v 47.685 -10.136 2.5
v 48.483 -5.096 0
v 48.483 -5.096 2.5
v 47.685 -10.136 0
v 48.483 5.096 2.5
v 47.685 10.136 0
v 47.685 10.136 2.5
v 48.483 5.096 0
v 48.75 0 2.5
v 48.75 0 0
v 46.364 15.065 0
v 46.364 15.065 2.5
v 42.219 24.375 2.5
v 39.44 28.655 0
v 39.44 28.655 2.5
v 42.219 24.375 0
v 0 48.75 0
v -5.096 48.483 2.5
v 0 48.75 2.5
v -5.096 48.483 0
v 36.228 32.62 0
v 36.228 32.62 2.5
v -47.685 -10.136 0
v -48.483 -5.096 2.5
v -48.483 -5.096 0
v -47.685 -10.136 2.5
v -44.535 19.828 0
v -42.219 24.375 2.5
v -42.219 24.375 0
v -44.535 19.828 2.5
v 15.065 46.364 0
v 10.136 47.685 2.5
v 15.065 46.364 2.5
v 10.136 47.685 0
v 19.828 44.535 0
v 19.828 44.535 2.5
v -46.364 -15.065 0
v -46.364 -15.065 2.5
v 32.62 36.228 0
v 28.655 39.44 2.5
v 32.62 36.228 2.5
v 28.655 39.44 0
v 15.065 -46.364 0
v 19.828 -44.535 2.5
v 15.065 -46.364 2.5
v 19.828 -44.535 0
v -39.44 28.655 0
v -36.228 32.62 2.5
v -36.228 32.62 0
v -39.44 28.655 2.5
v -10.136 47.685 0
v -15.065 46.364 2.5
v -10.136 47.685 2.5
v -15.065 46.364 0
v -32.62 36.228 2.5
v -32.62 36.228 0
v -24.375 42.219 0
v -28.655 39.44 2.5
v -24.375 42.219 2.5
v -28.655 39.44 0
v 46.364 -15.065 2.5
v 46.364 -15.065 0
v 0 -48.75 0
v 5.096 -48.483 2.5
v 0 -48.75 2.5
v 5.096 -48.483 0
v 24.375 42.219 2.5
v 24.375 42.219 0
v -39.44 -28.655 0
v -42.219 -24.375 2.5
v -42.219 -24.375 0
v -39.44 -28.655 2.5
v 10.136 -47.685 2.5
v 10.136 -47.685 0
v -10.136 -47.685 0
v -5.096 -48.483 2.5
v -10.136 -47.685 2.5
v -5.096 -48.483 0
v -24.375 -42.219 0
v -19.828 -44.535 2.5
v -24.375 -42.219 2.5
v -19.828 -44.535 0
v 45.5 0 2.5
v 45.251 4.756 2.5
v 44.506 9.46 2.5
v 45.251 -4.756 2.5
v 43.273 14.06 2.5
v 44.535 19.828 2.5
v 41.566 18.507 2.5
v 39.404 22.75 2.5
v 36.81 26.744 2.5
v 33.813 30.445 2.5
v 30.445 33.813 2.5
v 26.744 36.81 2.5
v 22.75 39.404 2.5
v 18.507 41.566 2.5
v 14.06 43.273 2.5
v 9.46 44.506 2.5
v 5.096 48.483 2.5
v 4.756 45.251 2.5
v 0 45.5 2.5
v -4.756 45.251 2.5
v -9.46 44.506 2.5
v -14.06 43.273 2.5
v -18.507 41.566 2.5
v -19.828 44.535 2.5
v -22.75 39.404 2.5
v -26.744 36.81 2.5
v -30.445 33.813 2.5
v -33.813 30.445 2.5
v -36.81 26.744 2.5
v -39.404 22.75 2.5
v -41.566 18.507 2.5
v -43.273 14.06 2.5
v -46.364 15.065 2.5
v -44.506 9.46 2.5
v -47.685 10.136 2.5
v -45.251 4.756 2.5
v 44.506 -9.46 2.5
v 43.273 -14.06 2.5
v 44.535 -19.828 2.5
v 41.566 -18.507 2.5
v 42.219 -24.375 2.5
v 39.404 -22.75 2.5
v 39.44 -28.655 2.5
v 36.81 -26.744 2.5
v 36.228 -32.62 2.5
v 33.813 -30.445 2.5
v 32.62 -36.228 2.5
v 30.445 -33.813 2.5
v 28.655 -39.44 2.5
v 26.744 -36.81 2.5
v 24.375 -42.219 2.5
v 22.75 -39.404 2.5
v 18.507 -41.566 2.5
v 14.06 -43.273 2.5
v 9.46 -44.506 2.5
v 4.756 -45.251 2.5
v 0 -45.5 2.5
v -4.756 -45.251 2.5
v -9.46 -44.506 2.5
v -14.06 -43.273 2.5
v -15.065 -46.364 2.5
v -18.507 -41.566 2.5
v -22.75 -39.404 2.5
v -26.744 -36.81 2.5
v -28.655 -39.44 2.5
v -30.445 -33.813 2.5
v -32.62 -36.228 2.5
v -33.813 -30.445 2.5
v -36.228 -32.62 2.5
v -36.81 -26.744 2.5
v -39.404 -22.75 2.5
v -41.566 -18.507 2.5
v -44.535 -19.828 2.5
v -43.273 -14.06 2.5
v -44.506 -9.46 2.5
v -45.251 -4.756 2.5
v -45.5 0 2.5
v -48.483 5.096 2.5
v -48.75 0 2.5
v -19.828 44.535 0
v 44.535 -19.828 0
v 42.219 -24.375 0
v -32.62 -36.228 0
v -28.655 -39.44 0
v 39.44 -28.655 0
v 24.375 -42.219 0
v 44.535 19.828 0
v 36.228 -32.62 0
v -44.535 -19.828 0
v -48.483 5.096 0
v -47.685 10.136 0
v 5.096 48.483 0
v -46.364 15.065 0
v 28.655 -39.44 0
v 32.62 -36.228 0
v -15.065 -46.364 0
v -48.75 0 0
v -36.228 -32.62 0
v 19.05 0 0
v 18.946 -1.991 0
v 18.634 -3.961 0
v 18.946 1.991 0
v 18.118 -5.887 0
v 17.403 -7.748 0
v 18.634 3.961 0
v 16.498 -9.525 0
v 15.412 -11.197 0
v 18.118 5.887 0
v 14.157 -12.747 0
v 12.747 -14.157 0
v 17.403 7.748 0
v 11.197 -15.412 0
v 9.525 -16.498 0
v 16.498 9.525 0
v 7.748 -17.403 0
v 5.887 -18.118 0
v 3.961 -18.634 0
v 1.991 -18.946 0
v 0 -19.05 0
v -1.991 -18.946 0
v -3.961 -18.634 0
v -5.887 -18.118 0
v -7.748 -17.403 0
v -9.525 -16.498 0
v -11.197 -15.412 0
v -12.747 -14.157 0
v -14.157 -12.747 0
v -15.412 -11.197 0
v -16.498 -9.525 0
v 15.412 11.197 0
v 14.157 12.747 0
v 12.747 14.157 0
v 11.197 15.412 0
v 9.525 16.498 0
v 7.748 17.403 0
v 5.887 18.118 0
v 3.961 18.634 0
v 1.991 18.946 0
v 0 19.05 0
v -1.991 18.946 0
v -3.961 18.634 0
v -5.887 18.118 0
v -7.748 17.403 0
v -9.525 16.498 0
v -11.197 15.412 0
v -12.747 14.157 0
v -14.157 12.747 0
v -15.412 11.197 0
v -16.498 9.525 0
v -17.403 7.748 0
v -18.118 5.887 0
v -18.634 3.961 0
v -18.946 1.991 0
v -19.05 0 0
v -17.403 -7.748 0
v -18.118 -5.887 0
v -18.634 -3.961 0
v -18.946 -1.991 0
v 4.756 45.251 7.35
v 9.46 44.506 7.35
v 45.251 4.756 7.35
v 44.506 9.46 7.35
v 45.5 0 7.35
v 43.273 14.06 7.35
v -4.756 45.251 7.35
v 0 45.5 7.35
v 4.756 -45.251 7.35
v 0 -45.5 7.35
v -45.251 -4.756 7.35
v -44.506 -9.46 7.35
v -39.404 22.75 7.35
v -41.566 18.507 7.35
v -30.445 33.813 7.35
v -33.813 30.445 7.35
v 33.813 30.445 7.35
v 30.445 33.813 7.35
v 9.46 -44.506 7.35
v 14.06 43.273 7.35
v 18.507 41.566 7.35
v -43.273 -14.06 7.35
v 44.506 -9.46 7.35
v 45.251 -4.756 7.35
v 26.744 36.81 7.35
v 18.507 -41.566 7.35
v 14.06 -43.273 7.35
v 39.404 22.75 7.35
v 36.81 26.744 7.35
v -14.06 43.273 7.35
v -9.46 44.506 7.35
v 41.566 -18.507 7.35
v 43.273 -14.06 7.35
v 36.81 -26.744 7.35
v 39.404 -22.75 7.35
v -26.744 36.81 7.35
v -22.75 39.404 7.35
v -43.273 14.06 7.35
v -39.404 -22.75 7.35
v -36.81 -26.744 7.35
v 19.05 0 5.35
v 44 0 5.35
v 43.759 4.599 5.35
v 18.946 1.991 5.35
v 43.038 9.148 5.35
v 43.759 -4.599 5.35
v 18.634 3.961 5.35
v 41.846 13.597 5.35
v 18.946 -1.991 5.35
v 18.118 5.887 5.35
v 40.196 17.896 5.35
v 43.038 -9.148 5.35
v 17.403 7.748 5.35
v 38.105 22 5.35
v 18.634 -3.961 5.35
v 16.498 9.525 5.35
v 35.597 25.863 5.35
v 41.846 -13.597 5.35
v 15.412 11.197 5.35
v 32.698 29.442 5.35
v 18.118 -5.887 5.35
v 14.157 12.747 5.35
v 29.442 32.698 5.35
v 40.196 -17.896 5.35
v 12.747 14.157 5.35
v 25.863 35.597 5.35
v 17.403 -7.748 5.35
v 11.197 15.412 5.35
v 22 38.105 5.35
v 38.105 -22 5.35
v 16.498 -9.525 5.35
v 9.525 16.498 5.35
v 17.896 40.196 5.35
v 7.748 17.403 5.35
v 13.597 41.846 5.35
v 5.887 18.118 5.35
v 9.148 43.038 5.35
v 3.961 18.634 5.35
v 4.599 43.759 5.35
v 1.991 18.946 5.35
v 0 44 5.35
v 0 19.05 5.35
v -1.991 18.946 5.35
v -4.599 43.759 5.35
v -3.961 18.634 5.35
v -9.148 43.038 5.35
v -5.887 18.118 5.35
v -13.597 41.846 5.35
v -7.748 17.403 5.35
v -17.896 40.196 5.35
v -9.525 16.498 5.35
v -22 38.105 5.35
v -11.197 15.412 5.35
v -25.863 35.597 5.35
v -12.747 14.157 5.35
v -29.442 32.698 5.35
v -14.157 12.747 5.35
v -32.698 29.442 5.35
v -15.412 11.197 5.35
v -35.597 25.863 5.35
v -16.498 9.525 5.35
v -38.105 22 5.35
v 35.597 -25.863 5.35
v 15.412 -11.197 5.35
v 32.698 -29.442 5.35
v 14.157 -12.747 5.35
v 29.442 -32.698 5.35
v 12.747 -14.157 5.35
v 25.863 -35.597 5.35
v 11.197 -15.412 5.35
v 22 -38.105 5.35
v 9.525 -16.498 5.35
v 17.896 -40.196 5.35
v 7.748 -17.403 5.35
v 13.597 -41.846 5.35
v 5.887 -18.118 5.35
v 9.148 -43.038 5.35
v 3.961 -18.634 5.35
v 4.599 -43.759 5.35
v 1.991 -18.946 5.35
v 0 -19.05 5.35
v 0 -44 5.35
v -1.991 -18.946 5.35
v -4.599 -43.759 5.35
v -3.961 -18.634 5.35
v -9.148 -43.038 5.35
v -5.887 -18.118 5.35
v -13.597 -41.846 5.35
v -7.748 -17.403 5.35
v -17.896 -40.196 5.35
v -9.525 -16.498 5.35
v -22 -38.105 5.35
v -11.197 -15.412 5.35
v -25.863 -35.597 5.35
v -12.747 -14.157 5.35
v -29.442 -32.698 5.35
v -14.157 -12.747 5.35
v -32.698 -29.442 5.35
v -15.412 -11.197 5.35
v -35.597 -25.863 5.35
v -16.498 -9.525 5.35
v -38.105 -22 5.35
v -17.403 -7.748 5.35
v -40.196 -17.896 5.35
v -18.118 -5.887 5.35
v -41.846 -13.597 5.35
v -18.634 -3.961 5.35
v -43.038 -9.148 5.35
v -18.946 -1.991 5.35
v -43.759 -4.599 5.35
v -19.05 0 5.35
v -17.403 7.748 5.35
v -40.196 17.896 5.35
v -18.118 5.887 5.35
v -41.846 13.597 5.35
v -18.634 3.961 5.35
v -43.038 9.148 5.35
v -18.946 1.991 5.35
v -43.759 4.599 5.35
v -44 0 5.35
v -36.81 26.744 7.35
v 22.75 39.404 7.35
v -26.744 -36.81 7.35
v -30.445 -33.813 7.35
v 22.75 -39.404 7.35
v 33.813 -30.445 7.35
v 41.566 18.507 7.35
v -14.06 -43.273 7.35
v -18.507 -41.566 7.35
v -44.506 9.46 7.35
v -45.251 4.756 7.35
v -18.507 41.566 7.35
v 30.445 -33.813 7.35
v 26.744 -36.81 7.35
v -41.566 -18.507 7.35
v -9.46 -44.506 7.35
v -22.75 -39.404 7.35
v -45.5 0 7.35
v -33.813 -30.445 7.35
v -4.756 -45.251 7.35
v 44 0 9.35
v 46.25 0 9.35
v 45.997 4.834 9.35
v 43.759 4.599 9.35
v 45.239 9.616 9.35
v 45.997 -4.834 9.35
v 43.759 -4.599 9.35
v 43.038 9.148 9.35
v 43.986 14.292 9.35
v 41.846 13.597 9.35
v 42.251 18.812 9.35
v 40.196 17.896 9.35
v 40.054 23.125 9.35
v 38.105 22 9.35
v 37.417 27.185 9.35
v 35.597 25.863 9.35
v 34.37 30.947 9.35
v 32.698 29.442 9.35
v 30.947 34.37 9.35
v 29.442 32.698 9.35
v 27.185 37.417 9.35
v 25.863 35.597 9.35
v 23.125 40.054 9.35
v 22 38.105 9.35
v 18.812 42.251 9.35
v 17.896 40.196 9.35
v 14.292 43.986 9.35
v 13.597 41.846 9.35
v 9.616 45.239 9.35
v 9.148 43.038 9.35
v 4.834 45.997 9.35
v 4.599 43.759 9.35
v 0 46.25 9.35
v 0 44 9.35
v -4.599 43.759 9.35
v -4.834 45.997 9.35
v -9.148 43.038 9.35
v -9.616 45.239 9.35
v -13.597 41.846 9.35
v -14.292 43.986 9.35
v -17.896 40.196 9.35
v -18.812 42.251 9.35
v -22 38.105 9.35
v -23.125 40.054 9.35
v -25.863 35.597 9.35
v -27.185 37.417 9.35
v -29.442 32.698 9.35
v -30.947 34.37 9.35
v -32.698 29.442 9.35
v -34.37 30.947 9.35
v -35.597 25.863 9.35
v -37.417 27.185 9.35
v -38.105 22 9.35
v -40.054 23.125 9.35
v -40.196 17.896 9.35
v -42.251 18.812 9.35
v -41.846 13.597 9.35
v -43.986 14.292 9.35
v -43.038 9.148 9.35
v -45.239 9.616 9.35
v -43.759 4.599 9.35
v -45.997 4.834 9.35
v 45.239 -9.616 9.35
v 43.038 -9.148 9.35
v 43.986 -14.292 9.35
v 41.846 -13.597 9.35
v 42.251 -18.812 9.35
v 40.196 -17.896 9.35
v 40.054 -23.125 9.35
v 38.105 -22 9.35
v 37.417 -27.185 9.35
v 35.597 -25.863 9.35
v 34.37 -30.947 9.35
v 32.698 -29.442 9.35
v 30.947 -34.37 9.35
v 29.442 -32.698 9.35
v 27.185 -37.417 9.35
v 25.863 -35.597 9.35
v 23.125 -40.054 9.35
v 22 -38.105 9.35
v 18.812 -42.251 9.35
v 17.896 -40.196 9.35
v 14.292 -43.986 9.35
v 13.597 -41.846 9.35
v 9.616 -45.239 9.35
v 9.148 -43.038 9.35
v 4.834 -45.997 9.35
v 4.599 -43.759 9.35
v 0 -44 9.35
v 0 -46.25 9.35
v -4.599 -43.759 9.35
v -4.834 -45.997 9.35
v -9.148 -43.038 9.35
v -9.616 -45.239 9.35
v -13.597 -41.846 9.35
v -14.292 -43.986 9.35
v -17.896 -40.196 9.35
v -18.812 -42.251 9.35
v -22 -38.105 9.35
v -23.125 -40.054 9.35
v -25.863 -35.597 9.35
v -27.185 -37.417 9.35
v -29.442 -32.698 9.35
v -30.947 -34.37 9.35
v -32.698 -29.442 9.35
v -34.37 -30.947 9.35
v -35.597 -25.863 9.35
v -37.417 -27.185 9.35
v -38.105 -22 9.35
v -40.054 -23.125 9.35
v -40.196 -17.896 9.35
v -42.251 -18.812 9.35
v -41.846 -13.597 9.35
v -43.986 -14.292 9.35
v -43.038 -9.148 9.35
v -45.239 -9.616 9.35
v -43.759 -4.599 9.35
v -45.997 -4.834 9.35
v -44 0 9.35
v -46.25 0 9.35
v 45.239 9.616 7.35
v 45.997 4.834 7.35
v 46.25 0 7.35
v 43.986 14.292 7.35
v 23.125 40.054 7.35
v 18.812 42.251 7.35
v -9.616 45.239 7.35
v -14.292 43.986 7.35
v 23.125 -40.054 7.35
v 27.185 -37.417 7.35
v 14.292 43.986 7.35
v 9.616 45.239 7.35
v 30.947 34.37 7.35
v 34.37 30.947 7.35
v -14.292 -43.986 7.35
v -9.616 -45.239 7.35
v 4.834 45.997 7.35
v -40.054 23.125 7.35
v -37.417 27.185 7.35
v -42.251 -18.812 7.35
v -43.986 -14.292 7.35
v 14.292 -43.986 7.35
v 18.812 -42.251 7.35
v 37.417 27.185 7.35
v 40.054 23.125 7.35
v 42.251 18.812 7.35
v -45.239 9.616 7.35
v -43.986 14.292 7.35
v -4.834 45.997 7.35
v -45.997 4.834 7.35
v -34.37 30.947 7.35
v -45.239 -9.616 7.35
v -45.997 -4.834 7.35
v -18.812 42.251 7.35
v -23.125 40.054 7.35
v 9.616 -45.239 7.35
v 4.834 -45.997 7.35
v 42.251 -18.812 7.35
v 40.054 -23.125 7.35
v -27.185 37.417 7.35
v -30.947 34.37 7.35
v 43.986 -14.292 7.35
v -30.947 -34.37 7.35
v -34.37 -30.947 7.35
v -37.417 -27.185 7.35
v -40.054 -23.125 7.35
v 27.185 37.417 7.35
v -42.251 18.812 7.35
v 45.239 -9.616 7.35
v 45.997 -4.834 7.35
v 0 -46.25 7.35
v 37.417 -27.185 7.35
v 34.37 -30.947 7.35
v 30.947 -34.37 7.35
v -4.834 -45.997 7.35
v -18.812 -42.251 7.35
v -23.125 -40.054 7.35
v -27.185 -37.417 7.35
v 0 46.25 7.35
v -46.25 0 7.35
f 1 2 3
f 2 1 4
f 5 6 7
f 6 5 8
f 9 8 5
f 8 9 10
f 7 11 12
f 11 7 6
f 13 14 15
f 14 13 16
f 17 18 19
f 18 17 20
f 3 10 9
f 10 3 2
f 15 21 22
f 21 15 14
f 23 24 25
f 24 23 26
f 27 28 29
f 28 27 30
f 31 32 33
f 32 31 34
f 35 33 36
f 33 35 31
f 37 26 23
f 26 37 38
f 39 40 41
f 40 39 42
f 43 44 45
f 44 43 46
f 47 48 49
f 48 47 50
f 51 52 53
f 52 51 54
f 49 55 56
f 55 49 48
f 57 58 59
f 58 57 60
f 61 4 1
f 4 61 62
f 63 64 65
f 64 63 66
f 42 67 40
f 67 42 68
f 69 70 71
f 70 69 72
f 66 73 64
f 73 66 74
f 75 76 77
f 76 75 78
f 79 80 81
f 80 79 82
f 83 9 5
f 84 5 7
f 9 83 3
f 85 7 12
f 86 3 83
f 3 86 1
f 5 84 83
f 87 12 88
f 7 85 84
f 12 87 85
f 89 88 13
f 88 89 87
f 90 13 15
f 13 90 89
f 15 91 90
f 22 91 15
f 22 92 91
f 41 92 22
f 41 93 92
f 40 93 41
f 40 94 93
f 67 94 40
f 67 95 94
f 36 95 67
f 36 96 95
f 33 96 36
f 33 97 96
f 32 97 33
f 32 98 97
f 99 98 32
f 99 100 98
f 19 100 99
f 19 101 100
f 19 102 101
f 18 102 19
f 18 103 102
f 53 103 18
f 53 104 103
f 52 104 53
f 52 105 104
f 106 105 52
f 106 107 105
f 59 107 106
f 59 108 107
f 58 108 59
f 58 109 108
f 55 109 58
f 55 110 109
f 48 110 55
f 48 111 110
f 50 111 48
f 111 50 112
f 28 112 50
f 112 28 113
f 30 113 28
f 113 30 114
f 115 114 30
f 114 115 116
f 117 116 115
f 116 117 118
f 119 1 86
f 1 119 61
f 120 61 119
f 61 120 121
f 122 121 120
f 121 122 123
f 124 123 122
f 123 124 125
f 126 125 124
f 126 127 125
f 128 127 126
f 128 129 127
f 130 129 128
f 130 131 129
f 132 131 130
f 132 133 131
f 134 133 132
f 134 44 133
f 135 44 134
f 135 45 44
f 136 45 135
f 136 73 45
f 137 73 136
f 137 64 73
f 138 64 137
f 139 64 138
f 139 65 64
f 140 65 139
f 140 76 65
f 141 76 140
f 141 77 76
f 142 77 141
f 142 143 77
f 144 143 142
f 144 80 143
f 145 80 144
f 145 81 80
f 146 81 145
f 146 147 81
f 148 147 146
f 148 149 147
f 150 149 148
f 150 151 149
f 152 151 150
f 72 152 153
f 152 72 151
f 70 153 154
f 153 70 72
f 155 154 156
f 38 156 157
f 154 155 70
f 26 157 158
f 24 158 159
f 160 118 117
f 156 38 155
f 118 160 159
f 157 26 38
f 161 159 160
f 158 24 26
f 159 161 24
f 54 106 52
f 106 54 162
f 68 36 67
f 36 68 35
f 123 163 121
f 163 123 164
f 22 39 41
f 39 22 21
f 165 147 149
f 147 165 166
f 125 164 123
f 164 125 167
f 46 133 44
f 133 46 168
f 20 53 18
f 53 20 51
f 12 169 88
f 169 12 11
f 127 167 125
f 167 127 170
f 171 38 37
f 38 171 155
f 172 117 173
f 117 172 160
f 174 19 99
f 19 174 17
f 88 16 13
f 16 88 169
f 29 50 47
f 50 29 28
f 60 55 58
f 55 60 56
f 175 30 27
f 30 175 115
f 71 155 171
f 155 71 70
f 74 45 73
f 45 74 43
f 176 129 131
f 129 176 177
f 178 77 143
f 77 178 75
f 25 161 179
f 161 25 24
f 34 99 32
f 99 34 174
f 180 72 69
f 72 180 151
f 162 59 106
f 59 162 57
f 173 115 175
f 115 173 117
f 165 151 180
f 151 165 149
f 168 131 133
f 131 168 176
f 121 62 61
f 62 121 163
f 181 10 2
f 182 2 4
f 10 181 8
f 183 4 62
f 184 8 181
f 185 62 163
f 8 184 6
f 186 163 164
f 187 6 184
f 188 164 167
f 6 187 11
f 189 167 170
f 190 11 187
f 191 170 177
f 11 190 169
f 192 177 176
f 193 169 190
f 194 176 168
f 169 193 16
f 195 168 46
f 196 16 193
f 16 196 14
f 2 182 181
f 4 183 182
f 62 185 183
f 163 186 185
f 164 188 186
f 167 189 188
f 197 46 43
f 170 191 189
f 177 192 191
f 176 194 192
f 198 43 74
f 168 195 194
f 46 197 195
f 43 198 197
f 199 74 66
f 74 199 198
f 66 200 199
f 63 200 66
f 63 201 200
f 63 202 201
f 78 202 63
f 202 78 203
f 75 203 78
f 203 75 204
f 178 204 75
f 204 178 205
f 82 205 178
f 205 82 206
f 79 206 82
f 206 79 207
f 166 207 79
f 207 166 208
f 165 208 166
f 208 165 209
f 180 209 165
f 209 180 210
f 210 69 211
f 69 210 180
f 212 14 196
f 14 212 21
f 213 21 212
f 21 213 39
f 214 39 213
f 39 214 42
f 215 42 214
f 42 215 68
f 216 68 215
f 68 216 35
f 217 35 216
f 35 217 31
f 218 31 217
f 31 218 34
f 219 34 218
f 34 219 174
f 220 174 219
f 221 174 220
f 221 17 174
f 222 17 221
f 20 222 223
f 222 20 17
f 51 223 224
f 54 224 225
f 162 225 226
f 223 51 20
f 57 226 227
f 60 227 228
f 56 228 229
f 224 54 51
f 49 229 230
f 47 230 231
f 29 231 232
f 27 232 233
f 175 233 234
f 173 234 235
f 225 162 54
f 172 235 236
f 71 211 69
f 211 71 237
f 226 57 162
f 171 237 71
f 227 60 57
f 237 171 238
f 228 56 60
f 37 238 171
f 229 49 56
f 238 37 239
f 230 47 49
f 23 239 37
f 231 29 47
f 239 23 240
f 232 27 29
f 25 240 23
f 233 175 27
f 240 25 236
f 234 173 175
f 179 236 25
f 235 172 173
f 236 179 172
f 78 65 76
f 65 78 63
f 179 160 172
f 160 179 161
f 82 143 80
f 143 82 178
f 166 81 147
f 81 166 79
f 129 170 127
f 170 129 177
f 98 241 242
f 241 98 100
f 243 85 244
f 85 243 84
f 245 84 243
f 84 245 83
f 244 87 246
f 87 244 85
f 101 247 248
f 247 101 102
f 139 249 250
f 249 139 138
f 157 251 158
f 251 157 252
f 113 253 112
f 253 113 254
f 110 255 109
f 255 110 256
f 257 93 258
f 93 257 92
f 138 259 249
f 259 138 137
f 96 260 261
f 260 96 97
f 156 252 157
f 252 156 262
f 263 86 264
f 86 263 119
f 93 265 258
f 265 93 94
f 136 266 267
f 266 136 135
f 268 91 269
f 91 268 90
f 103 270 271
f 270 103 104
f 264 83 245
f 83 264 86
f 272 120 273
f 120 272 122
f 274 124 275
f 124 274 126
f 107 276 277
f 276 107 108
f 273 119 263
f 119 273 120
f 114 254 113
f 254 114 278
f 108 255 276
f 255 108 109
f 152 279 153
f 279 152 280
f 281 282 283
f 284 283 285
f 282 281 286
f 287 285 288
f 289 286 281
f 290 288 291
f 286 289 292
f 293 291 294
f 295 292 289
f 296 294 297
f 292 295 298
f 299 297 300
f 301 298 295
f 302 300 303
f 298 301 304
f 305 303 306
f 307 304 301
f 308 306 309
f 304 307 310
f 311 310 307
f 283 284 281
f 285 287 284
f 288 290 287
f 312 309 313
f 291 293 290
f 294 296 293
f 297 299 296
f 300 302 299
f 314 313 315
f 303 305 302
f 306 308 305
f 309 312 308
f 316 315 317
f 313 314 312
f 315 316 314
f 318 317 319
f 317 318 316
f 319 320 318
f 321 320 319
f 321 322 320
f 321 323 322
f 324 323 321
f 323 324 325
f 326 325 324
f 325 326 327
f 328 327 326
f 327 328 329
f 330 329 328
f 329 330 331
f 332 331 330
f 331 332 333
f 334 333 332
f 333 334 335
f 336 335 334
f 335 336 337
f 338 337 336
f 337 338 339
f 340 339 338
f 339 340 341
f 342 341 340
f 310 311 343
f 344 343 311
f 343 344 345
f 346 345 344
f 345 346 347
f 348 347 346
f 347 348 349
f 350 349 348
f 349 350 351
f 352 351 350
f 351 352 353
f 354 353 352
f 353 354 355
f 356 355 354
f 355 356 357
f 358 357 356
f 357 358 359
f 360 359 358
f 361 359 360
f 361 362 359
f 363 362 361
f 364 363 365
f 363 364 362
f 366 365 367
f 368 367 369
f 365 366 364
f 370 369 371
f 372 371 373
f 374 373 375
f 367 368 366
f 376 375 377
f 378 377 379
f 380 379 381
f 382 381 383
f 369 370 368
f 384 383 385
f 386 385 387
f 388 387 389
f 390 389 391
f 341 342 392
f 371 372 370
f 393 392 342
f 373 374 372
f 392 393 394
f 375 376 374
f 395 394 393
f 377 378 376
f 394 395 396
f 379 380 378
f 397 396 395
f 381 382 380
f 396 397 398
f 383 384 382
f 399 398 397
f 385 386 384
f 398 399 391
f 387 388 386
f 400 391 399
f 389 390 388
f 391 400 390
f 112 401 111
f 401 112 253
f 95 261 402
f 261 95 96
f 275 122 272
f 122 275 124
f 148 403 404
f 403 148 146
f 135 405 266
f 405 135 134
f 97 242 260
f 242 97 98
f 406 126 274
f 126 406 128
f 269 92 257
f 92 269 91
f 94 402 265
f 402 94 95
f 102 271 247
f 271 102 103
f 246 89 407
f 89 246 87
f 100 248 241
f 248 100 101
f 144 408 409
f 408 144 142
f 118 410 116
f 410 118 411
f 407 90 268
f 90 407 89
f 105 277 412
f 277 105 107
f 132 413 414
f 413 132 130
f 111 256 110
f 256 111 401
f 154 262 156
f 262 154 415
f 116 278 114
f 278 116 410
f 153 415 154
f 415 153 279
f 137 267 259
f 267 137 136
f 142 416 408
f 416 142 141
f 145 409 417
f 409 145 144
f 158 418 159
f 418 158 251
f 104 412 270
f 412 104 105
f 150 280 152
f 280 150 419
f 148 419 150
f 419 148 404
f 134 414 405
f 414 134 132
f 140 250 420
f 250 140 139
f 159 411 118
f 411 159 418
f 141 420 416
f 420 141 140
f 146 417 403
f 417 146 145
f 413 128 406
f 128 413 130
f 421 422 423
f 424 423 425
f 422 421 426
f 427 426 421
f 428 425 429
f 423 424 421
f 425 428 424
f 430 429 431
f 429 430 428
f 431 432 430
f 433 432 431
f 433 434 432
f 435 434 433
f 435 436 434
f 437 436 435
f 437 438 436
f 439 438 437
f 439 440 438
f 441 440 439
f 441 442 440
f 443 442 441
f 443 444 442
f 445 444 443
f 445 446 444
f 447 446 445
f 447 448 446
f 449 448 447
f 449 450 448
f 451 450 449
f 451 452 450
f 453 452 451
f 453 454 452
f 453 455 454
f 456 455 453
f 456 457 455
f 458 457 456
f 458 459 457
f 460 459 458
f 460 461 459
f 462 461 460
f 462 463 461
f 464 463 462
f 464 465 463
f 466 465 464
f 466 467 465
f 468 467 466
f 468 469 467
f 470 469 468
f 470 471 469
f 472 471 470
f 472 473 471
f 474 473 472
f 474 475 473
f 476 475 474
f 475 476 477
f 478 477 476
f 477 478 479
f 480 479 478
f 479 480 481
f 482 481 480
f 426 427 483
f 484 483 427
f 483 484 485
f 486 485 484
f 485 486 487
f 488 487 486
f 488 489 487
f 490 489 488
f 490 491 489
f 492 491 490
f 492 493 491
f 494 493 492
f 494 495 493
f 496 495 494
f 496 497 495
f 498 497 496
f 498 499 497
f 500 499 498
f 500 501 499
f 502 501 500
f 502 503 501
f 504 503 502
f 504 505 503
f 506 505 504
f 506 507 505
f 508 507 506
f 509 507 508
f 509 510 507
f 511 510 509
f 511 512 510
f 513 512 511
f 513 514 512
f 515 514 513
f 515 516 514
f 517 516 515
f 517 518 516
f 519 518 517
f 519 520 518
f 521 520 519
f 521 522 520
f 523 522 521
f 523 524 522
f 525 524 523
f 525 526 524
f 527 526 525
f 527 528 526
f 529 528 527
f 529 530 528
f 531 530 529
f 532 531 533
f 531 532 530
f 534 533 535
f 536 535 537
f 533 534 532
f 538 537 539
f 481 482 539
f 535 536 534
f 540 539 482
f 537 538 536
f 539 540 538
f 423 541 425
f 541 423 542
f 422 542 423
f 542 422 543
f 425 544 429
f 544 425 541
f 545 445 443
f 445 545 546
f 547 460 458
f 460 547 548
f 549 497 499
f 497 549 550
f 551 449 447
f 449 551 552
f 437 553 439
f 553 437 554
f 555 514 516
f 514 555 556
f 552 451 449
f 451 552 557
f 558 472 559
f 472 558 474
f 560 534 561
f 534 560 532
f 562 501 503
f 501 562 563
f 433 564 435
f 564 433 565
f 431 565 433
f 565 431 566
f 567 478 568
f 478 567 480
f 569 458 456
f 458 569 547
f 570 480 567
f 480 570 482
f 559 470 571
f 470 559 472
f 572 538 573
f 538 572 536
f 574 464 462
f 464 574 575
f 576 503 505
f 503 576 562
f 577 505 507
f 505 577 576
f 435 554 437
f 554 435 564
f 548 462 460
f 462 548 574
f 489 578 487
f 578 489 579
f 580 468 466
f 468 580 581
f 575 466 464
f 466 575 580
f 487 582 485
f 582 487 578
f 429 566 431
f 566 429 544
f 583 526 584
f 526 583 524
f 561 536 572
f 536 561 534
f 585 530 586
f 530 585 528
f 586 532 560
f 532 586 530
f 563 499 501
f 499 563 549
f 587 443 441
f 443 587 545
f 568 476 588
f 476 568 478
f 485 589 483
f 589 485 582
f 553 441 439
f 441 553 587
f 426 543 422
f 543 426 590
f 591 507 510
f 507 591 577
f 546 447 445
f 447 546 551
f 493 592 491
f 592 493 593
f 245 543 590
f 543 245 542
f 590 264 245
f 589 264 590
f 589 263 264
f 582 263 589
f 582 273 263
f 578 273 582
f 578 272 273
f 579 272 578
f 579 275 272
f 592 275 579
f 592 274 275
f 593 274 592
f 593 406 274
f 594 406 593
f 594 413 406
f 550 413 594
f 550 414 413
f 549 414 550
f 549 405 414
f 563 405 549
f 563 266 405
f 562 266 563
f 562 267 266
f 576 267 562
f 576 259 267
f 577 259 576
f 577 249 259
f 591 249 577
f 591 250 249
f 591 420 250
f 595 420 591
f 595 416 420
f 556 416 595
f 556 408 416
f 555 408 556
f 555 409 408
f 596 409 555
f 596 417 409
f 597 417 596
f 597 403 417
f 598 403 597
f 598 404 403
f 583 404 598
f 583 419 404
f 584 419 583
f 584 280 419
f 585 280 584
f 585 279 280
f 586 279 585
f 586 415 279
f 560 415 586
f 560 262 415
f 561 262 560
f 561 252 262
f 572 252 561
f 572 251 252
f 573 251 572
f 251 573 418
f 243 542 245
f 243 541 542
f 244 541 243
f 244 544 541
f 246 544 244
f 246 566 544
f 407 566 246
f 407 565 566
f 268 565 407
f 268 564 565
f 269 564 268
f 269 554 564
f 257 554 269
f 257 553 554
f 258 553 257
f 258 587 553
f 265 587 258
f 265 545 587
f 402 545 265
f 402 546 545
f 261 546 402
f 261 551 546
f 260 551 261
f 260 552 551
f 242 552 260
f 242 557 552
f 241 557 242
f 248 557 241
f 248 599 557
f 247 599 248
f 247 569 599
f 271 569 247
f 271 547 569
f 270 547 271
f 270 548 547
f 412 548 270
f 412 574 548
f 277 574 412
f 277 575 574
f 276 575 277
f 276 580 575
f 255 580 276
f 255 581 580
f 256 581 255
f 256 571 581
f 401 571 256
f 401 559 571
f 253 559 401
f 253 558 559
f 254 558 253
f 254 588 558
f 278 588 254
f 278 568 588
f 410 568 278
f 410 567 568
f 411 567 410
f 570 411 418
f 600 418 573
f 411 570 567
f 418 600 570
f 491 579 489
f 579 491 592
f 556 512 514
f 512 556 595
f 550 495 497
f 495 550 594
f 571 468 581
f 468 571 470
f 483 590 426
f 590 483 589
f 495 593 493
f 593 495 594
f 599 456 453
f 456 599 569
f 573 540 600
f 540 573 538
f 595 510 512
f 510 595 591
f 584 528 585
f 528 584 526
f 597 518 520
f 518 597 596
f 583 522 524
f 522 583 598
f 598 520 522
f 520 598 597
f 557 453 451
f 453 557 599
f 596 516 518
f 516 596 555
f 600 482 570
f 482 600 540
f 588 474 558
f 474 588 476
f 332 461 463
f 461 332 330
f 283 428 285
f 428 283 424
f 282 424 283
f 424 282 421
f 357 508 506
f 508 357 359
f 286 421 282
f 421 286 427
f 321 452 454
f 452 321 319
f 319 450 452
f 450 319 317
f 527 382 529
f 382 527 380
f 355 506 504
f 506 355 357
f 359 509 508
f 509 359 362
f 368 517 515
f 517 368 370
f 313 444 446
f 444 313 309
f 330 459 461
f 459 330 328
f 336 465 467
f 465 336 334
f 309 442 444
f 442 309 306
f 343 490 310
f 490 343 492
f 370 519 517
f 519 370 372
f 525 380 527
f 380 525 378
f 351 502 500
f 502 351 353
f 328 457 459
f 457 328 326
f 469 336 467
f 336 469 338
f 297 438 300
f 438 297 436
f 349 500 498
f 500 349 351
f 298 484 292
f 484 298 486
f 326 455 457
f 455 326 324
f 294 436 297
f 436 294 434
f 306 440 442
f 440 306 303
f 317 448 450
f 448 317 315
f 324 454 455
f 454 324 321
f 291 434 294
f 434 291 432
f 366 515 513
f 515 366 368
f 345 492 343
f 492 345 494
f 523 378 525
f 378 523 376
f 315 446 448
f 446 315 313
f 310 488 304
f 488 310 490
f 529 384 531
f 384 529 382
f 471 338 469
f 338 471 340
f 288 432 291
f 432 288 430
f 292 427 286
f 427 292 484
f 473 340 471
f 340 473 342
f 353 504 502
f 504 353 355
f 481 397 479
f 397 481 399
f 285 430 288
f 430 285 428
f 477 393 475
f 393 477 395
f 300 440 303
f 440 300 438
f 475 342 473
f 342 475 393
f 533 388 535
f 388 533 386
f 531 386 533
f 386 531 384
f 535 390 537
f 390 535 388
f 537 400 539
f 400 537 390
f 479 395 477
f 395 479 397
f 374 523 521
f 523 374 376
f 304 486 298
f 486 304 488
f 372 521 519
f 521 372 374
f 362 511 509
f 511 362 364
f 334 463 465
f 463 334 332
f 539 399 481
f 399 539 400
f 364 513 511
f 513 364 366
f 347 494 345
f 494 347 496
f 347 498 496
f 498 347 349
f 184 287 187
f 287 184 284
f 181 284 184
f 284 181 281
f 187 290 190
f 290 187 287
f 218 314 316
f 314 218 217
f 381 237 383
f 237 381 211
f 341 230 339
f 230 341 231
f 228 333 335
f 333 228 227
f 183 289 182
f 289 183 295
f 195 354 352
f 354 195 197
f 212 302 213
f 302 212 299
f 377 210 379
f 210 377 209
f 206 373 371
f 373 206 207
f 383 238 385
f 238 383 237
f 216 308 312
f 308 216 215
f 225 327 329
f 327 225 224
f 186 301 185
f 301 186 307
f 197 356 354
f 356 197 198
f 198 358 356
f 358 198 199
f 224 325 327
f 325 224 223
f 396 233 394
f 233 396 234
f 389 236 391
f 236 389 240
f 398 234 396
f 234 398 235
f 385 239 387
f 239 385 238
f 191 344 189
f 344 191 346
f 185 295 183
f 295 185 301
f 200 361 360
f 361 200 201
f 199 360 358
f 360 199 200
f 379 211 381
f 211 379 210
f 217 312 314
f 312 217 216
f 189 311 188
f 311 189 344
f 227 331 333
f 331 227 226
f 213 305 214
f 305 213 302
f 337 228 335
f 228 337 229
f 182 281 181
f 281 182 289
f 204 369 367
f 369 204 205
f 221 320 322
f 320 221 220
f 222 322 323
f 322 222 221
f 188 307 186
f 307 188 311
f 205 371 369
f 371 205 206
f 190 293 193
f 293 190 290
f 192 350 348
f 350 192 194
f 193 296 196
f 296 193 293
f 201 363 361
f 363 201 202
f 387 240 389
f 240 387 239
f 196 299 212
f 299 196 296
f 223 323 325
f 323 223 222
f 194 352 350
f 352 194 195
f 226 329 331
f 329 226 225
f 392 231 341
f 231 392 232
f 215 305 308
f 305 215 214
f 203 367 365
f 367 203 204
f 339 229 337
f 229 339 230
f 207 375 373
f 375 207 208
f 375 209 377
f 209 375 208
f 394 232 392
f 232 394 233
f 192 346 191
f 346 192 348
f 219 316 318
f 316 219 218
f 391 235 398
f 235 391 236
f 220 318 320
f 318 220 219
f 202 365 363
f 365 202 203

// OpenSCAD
//Bit diameter
in=1.5;
//overhang of tab
tabhang=.75;
//Resolution
res=60;
//Calculation
in2mm=in*25.4;
diatabhang=2*tabhang;

module insert(){
union(){
union(){
    cylinder(2.5, d=97.5, $fn=60);
    translate([0,0,2.5]) cylinder(2.85, d=91, $fn=60);
}
   difference(){ 
       union(){
           translate([0,0,5.35]) cylinder(4, d=91, $fn=res);
           translate([0,0,7.35]) cylinder(2, d=91+diatabhang, $fn=res);
       }
           translate([0,0,5.35]) cylinder(6, d=88, $fn=res); 
}
}
}

difference(){
    insert();
    cylinder(5.35, d=in2mm, $fn=res);
}
